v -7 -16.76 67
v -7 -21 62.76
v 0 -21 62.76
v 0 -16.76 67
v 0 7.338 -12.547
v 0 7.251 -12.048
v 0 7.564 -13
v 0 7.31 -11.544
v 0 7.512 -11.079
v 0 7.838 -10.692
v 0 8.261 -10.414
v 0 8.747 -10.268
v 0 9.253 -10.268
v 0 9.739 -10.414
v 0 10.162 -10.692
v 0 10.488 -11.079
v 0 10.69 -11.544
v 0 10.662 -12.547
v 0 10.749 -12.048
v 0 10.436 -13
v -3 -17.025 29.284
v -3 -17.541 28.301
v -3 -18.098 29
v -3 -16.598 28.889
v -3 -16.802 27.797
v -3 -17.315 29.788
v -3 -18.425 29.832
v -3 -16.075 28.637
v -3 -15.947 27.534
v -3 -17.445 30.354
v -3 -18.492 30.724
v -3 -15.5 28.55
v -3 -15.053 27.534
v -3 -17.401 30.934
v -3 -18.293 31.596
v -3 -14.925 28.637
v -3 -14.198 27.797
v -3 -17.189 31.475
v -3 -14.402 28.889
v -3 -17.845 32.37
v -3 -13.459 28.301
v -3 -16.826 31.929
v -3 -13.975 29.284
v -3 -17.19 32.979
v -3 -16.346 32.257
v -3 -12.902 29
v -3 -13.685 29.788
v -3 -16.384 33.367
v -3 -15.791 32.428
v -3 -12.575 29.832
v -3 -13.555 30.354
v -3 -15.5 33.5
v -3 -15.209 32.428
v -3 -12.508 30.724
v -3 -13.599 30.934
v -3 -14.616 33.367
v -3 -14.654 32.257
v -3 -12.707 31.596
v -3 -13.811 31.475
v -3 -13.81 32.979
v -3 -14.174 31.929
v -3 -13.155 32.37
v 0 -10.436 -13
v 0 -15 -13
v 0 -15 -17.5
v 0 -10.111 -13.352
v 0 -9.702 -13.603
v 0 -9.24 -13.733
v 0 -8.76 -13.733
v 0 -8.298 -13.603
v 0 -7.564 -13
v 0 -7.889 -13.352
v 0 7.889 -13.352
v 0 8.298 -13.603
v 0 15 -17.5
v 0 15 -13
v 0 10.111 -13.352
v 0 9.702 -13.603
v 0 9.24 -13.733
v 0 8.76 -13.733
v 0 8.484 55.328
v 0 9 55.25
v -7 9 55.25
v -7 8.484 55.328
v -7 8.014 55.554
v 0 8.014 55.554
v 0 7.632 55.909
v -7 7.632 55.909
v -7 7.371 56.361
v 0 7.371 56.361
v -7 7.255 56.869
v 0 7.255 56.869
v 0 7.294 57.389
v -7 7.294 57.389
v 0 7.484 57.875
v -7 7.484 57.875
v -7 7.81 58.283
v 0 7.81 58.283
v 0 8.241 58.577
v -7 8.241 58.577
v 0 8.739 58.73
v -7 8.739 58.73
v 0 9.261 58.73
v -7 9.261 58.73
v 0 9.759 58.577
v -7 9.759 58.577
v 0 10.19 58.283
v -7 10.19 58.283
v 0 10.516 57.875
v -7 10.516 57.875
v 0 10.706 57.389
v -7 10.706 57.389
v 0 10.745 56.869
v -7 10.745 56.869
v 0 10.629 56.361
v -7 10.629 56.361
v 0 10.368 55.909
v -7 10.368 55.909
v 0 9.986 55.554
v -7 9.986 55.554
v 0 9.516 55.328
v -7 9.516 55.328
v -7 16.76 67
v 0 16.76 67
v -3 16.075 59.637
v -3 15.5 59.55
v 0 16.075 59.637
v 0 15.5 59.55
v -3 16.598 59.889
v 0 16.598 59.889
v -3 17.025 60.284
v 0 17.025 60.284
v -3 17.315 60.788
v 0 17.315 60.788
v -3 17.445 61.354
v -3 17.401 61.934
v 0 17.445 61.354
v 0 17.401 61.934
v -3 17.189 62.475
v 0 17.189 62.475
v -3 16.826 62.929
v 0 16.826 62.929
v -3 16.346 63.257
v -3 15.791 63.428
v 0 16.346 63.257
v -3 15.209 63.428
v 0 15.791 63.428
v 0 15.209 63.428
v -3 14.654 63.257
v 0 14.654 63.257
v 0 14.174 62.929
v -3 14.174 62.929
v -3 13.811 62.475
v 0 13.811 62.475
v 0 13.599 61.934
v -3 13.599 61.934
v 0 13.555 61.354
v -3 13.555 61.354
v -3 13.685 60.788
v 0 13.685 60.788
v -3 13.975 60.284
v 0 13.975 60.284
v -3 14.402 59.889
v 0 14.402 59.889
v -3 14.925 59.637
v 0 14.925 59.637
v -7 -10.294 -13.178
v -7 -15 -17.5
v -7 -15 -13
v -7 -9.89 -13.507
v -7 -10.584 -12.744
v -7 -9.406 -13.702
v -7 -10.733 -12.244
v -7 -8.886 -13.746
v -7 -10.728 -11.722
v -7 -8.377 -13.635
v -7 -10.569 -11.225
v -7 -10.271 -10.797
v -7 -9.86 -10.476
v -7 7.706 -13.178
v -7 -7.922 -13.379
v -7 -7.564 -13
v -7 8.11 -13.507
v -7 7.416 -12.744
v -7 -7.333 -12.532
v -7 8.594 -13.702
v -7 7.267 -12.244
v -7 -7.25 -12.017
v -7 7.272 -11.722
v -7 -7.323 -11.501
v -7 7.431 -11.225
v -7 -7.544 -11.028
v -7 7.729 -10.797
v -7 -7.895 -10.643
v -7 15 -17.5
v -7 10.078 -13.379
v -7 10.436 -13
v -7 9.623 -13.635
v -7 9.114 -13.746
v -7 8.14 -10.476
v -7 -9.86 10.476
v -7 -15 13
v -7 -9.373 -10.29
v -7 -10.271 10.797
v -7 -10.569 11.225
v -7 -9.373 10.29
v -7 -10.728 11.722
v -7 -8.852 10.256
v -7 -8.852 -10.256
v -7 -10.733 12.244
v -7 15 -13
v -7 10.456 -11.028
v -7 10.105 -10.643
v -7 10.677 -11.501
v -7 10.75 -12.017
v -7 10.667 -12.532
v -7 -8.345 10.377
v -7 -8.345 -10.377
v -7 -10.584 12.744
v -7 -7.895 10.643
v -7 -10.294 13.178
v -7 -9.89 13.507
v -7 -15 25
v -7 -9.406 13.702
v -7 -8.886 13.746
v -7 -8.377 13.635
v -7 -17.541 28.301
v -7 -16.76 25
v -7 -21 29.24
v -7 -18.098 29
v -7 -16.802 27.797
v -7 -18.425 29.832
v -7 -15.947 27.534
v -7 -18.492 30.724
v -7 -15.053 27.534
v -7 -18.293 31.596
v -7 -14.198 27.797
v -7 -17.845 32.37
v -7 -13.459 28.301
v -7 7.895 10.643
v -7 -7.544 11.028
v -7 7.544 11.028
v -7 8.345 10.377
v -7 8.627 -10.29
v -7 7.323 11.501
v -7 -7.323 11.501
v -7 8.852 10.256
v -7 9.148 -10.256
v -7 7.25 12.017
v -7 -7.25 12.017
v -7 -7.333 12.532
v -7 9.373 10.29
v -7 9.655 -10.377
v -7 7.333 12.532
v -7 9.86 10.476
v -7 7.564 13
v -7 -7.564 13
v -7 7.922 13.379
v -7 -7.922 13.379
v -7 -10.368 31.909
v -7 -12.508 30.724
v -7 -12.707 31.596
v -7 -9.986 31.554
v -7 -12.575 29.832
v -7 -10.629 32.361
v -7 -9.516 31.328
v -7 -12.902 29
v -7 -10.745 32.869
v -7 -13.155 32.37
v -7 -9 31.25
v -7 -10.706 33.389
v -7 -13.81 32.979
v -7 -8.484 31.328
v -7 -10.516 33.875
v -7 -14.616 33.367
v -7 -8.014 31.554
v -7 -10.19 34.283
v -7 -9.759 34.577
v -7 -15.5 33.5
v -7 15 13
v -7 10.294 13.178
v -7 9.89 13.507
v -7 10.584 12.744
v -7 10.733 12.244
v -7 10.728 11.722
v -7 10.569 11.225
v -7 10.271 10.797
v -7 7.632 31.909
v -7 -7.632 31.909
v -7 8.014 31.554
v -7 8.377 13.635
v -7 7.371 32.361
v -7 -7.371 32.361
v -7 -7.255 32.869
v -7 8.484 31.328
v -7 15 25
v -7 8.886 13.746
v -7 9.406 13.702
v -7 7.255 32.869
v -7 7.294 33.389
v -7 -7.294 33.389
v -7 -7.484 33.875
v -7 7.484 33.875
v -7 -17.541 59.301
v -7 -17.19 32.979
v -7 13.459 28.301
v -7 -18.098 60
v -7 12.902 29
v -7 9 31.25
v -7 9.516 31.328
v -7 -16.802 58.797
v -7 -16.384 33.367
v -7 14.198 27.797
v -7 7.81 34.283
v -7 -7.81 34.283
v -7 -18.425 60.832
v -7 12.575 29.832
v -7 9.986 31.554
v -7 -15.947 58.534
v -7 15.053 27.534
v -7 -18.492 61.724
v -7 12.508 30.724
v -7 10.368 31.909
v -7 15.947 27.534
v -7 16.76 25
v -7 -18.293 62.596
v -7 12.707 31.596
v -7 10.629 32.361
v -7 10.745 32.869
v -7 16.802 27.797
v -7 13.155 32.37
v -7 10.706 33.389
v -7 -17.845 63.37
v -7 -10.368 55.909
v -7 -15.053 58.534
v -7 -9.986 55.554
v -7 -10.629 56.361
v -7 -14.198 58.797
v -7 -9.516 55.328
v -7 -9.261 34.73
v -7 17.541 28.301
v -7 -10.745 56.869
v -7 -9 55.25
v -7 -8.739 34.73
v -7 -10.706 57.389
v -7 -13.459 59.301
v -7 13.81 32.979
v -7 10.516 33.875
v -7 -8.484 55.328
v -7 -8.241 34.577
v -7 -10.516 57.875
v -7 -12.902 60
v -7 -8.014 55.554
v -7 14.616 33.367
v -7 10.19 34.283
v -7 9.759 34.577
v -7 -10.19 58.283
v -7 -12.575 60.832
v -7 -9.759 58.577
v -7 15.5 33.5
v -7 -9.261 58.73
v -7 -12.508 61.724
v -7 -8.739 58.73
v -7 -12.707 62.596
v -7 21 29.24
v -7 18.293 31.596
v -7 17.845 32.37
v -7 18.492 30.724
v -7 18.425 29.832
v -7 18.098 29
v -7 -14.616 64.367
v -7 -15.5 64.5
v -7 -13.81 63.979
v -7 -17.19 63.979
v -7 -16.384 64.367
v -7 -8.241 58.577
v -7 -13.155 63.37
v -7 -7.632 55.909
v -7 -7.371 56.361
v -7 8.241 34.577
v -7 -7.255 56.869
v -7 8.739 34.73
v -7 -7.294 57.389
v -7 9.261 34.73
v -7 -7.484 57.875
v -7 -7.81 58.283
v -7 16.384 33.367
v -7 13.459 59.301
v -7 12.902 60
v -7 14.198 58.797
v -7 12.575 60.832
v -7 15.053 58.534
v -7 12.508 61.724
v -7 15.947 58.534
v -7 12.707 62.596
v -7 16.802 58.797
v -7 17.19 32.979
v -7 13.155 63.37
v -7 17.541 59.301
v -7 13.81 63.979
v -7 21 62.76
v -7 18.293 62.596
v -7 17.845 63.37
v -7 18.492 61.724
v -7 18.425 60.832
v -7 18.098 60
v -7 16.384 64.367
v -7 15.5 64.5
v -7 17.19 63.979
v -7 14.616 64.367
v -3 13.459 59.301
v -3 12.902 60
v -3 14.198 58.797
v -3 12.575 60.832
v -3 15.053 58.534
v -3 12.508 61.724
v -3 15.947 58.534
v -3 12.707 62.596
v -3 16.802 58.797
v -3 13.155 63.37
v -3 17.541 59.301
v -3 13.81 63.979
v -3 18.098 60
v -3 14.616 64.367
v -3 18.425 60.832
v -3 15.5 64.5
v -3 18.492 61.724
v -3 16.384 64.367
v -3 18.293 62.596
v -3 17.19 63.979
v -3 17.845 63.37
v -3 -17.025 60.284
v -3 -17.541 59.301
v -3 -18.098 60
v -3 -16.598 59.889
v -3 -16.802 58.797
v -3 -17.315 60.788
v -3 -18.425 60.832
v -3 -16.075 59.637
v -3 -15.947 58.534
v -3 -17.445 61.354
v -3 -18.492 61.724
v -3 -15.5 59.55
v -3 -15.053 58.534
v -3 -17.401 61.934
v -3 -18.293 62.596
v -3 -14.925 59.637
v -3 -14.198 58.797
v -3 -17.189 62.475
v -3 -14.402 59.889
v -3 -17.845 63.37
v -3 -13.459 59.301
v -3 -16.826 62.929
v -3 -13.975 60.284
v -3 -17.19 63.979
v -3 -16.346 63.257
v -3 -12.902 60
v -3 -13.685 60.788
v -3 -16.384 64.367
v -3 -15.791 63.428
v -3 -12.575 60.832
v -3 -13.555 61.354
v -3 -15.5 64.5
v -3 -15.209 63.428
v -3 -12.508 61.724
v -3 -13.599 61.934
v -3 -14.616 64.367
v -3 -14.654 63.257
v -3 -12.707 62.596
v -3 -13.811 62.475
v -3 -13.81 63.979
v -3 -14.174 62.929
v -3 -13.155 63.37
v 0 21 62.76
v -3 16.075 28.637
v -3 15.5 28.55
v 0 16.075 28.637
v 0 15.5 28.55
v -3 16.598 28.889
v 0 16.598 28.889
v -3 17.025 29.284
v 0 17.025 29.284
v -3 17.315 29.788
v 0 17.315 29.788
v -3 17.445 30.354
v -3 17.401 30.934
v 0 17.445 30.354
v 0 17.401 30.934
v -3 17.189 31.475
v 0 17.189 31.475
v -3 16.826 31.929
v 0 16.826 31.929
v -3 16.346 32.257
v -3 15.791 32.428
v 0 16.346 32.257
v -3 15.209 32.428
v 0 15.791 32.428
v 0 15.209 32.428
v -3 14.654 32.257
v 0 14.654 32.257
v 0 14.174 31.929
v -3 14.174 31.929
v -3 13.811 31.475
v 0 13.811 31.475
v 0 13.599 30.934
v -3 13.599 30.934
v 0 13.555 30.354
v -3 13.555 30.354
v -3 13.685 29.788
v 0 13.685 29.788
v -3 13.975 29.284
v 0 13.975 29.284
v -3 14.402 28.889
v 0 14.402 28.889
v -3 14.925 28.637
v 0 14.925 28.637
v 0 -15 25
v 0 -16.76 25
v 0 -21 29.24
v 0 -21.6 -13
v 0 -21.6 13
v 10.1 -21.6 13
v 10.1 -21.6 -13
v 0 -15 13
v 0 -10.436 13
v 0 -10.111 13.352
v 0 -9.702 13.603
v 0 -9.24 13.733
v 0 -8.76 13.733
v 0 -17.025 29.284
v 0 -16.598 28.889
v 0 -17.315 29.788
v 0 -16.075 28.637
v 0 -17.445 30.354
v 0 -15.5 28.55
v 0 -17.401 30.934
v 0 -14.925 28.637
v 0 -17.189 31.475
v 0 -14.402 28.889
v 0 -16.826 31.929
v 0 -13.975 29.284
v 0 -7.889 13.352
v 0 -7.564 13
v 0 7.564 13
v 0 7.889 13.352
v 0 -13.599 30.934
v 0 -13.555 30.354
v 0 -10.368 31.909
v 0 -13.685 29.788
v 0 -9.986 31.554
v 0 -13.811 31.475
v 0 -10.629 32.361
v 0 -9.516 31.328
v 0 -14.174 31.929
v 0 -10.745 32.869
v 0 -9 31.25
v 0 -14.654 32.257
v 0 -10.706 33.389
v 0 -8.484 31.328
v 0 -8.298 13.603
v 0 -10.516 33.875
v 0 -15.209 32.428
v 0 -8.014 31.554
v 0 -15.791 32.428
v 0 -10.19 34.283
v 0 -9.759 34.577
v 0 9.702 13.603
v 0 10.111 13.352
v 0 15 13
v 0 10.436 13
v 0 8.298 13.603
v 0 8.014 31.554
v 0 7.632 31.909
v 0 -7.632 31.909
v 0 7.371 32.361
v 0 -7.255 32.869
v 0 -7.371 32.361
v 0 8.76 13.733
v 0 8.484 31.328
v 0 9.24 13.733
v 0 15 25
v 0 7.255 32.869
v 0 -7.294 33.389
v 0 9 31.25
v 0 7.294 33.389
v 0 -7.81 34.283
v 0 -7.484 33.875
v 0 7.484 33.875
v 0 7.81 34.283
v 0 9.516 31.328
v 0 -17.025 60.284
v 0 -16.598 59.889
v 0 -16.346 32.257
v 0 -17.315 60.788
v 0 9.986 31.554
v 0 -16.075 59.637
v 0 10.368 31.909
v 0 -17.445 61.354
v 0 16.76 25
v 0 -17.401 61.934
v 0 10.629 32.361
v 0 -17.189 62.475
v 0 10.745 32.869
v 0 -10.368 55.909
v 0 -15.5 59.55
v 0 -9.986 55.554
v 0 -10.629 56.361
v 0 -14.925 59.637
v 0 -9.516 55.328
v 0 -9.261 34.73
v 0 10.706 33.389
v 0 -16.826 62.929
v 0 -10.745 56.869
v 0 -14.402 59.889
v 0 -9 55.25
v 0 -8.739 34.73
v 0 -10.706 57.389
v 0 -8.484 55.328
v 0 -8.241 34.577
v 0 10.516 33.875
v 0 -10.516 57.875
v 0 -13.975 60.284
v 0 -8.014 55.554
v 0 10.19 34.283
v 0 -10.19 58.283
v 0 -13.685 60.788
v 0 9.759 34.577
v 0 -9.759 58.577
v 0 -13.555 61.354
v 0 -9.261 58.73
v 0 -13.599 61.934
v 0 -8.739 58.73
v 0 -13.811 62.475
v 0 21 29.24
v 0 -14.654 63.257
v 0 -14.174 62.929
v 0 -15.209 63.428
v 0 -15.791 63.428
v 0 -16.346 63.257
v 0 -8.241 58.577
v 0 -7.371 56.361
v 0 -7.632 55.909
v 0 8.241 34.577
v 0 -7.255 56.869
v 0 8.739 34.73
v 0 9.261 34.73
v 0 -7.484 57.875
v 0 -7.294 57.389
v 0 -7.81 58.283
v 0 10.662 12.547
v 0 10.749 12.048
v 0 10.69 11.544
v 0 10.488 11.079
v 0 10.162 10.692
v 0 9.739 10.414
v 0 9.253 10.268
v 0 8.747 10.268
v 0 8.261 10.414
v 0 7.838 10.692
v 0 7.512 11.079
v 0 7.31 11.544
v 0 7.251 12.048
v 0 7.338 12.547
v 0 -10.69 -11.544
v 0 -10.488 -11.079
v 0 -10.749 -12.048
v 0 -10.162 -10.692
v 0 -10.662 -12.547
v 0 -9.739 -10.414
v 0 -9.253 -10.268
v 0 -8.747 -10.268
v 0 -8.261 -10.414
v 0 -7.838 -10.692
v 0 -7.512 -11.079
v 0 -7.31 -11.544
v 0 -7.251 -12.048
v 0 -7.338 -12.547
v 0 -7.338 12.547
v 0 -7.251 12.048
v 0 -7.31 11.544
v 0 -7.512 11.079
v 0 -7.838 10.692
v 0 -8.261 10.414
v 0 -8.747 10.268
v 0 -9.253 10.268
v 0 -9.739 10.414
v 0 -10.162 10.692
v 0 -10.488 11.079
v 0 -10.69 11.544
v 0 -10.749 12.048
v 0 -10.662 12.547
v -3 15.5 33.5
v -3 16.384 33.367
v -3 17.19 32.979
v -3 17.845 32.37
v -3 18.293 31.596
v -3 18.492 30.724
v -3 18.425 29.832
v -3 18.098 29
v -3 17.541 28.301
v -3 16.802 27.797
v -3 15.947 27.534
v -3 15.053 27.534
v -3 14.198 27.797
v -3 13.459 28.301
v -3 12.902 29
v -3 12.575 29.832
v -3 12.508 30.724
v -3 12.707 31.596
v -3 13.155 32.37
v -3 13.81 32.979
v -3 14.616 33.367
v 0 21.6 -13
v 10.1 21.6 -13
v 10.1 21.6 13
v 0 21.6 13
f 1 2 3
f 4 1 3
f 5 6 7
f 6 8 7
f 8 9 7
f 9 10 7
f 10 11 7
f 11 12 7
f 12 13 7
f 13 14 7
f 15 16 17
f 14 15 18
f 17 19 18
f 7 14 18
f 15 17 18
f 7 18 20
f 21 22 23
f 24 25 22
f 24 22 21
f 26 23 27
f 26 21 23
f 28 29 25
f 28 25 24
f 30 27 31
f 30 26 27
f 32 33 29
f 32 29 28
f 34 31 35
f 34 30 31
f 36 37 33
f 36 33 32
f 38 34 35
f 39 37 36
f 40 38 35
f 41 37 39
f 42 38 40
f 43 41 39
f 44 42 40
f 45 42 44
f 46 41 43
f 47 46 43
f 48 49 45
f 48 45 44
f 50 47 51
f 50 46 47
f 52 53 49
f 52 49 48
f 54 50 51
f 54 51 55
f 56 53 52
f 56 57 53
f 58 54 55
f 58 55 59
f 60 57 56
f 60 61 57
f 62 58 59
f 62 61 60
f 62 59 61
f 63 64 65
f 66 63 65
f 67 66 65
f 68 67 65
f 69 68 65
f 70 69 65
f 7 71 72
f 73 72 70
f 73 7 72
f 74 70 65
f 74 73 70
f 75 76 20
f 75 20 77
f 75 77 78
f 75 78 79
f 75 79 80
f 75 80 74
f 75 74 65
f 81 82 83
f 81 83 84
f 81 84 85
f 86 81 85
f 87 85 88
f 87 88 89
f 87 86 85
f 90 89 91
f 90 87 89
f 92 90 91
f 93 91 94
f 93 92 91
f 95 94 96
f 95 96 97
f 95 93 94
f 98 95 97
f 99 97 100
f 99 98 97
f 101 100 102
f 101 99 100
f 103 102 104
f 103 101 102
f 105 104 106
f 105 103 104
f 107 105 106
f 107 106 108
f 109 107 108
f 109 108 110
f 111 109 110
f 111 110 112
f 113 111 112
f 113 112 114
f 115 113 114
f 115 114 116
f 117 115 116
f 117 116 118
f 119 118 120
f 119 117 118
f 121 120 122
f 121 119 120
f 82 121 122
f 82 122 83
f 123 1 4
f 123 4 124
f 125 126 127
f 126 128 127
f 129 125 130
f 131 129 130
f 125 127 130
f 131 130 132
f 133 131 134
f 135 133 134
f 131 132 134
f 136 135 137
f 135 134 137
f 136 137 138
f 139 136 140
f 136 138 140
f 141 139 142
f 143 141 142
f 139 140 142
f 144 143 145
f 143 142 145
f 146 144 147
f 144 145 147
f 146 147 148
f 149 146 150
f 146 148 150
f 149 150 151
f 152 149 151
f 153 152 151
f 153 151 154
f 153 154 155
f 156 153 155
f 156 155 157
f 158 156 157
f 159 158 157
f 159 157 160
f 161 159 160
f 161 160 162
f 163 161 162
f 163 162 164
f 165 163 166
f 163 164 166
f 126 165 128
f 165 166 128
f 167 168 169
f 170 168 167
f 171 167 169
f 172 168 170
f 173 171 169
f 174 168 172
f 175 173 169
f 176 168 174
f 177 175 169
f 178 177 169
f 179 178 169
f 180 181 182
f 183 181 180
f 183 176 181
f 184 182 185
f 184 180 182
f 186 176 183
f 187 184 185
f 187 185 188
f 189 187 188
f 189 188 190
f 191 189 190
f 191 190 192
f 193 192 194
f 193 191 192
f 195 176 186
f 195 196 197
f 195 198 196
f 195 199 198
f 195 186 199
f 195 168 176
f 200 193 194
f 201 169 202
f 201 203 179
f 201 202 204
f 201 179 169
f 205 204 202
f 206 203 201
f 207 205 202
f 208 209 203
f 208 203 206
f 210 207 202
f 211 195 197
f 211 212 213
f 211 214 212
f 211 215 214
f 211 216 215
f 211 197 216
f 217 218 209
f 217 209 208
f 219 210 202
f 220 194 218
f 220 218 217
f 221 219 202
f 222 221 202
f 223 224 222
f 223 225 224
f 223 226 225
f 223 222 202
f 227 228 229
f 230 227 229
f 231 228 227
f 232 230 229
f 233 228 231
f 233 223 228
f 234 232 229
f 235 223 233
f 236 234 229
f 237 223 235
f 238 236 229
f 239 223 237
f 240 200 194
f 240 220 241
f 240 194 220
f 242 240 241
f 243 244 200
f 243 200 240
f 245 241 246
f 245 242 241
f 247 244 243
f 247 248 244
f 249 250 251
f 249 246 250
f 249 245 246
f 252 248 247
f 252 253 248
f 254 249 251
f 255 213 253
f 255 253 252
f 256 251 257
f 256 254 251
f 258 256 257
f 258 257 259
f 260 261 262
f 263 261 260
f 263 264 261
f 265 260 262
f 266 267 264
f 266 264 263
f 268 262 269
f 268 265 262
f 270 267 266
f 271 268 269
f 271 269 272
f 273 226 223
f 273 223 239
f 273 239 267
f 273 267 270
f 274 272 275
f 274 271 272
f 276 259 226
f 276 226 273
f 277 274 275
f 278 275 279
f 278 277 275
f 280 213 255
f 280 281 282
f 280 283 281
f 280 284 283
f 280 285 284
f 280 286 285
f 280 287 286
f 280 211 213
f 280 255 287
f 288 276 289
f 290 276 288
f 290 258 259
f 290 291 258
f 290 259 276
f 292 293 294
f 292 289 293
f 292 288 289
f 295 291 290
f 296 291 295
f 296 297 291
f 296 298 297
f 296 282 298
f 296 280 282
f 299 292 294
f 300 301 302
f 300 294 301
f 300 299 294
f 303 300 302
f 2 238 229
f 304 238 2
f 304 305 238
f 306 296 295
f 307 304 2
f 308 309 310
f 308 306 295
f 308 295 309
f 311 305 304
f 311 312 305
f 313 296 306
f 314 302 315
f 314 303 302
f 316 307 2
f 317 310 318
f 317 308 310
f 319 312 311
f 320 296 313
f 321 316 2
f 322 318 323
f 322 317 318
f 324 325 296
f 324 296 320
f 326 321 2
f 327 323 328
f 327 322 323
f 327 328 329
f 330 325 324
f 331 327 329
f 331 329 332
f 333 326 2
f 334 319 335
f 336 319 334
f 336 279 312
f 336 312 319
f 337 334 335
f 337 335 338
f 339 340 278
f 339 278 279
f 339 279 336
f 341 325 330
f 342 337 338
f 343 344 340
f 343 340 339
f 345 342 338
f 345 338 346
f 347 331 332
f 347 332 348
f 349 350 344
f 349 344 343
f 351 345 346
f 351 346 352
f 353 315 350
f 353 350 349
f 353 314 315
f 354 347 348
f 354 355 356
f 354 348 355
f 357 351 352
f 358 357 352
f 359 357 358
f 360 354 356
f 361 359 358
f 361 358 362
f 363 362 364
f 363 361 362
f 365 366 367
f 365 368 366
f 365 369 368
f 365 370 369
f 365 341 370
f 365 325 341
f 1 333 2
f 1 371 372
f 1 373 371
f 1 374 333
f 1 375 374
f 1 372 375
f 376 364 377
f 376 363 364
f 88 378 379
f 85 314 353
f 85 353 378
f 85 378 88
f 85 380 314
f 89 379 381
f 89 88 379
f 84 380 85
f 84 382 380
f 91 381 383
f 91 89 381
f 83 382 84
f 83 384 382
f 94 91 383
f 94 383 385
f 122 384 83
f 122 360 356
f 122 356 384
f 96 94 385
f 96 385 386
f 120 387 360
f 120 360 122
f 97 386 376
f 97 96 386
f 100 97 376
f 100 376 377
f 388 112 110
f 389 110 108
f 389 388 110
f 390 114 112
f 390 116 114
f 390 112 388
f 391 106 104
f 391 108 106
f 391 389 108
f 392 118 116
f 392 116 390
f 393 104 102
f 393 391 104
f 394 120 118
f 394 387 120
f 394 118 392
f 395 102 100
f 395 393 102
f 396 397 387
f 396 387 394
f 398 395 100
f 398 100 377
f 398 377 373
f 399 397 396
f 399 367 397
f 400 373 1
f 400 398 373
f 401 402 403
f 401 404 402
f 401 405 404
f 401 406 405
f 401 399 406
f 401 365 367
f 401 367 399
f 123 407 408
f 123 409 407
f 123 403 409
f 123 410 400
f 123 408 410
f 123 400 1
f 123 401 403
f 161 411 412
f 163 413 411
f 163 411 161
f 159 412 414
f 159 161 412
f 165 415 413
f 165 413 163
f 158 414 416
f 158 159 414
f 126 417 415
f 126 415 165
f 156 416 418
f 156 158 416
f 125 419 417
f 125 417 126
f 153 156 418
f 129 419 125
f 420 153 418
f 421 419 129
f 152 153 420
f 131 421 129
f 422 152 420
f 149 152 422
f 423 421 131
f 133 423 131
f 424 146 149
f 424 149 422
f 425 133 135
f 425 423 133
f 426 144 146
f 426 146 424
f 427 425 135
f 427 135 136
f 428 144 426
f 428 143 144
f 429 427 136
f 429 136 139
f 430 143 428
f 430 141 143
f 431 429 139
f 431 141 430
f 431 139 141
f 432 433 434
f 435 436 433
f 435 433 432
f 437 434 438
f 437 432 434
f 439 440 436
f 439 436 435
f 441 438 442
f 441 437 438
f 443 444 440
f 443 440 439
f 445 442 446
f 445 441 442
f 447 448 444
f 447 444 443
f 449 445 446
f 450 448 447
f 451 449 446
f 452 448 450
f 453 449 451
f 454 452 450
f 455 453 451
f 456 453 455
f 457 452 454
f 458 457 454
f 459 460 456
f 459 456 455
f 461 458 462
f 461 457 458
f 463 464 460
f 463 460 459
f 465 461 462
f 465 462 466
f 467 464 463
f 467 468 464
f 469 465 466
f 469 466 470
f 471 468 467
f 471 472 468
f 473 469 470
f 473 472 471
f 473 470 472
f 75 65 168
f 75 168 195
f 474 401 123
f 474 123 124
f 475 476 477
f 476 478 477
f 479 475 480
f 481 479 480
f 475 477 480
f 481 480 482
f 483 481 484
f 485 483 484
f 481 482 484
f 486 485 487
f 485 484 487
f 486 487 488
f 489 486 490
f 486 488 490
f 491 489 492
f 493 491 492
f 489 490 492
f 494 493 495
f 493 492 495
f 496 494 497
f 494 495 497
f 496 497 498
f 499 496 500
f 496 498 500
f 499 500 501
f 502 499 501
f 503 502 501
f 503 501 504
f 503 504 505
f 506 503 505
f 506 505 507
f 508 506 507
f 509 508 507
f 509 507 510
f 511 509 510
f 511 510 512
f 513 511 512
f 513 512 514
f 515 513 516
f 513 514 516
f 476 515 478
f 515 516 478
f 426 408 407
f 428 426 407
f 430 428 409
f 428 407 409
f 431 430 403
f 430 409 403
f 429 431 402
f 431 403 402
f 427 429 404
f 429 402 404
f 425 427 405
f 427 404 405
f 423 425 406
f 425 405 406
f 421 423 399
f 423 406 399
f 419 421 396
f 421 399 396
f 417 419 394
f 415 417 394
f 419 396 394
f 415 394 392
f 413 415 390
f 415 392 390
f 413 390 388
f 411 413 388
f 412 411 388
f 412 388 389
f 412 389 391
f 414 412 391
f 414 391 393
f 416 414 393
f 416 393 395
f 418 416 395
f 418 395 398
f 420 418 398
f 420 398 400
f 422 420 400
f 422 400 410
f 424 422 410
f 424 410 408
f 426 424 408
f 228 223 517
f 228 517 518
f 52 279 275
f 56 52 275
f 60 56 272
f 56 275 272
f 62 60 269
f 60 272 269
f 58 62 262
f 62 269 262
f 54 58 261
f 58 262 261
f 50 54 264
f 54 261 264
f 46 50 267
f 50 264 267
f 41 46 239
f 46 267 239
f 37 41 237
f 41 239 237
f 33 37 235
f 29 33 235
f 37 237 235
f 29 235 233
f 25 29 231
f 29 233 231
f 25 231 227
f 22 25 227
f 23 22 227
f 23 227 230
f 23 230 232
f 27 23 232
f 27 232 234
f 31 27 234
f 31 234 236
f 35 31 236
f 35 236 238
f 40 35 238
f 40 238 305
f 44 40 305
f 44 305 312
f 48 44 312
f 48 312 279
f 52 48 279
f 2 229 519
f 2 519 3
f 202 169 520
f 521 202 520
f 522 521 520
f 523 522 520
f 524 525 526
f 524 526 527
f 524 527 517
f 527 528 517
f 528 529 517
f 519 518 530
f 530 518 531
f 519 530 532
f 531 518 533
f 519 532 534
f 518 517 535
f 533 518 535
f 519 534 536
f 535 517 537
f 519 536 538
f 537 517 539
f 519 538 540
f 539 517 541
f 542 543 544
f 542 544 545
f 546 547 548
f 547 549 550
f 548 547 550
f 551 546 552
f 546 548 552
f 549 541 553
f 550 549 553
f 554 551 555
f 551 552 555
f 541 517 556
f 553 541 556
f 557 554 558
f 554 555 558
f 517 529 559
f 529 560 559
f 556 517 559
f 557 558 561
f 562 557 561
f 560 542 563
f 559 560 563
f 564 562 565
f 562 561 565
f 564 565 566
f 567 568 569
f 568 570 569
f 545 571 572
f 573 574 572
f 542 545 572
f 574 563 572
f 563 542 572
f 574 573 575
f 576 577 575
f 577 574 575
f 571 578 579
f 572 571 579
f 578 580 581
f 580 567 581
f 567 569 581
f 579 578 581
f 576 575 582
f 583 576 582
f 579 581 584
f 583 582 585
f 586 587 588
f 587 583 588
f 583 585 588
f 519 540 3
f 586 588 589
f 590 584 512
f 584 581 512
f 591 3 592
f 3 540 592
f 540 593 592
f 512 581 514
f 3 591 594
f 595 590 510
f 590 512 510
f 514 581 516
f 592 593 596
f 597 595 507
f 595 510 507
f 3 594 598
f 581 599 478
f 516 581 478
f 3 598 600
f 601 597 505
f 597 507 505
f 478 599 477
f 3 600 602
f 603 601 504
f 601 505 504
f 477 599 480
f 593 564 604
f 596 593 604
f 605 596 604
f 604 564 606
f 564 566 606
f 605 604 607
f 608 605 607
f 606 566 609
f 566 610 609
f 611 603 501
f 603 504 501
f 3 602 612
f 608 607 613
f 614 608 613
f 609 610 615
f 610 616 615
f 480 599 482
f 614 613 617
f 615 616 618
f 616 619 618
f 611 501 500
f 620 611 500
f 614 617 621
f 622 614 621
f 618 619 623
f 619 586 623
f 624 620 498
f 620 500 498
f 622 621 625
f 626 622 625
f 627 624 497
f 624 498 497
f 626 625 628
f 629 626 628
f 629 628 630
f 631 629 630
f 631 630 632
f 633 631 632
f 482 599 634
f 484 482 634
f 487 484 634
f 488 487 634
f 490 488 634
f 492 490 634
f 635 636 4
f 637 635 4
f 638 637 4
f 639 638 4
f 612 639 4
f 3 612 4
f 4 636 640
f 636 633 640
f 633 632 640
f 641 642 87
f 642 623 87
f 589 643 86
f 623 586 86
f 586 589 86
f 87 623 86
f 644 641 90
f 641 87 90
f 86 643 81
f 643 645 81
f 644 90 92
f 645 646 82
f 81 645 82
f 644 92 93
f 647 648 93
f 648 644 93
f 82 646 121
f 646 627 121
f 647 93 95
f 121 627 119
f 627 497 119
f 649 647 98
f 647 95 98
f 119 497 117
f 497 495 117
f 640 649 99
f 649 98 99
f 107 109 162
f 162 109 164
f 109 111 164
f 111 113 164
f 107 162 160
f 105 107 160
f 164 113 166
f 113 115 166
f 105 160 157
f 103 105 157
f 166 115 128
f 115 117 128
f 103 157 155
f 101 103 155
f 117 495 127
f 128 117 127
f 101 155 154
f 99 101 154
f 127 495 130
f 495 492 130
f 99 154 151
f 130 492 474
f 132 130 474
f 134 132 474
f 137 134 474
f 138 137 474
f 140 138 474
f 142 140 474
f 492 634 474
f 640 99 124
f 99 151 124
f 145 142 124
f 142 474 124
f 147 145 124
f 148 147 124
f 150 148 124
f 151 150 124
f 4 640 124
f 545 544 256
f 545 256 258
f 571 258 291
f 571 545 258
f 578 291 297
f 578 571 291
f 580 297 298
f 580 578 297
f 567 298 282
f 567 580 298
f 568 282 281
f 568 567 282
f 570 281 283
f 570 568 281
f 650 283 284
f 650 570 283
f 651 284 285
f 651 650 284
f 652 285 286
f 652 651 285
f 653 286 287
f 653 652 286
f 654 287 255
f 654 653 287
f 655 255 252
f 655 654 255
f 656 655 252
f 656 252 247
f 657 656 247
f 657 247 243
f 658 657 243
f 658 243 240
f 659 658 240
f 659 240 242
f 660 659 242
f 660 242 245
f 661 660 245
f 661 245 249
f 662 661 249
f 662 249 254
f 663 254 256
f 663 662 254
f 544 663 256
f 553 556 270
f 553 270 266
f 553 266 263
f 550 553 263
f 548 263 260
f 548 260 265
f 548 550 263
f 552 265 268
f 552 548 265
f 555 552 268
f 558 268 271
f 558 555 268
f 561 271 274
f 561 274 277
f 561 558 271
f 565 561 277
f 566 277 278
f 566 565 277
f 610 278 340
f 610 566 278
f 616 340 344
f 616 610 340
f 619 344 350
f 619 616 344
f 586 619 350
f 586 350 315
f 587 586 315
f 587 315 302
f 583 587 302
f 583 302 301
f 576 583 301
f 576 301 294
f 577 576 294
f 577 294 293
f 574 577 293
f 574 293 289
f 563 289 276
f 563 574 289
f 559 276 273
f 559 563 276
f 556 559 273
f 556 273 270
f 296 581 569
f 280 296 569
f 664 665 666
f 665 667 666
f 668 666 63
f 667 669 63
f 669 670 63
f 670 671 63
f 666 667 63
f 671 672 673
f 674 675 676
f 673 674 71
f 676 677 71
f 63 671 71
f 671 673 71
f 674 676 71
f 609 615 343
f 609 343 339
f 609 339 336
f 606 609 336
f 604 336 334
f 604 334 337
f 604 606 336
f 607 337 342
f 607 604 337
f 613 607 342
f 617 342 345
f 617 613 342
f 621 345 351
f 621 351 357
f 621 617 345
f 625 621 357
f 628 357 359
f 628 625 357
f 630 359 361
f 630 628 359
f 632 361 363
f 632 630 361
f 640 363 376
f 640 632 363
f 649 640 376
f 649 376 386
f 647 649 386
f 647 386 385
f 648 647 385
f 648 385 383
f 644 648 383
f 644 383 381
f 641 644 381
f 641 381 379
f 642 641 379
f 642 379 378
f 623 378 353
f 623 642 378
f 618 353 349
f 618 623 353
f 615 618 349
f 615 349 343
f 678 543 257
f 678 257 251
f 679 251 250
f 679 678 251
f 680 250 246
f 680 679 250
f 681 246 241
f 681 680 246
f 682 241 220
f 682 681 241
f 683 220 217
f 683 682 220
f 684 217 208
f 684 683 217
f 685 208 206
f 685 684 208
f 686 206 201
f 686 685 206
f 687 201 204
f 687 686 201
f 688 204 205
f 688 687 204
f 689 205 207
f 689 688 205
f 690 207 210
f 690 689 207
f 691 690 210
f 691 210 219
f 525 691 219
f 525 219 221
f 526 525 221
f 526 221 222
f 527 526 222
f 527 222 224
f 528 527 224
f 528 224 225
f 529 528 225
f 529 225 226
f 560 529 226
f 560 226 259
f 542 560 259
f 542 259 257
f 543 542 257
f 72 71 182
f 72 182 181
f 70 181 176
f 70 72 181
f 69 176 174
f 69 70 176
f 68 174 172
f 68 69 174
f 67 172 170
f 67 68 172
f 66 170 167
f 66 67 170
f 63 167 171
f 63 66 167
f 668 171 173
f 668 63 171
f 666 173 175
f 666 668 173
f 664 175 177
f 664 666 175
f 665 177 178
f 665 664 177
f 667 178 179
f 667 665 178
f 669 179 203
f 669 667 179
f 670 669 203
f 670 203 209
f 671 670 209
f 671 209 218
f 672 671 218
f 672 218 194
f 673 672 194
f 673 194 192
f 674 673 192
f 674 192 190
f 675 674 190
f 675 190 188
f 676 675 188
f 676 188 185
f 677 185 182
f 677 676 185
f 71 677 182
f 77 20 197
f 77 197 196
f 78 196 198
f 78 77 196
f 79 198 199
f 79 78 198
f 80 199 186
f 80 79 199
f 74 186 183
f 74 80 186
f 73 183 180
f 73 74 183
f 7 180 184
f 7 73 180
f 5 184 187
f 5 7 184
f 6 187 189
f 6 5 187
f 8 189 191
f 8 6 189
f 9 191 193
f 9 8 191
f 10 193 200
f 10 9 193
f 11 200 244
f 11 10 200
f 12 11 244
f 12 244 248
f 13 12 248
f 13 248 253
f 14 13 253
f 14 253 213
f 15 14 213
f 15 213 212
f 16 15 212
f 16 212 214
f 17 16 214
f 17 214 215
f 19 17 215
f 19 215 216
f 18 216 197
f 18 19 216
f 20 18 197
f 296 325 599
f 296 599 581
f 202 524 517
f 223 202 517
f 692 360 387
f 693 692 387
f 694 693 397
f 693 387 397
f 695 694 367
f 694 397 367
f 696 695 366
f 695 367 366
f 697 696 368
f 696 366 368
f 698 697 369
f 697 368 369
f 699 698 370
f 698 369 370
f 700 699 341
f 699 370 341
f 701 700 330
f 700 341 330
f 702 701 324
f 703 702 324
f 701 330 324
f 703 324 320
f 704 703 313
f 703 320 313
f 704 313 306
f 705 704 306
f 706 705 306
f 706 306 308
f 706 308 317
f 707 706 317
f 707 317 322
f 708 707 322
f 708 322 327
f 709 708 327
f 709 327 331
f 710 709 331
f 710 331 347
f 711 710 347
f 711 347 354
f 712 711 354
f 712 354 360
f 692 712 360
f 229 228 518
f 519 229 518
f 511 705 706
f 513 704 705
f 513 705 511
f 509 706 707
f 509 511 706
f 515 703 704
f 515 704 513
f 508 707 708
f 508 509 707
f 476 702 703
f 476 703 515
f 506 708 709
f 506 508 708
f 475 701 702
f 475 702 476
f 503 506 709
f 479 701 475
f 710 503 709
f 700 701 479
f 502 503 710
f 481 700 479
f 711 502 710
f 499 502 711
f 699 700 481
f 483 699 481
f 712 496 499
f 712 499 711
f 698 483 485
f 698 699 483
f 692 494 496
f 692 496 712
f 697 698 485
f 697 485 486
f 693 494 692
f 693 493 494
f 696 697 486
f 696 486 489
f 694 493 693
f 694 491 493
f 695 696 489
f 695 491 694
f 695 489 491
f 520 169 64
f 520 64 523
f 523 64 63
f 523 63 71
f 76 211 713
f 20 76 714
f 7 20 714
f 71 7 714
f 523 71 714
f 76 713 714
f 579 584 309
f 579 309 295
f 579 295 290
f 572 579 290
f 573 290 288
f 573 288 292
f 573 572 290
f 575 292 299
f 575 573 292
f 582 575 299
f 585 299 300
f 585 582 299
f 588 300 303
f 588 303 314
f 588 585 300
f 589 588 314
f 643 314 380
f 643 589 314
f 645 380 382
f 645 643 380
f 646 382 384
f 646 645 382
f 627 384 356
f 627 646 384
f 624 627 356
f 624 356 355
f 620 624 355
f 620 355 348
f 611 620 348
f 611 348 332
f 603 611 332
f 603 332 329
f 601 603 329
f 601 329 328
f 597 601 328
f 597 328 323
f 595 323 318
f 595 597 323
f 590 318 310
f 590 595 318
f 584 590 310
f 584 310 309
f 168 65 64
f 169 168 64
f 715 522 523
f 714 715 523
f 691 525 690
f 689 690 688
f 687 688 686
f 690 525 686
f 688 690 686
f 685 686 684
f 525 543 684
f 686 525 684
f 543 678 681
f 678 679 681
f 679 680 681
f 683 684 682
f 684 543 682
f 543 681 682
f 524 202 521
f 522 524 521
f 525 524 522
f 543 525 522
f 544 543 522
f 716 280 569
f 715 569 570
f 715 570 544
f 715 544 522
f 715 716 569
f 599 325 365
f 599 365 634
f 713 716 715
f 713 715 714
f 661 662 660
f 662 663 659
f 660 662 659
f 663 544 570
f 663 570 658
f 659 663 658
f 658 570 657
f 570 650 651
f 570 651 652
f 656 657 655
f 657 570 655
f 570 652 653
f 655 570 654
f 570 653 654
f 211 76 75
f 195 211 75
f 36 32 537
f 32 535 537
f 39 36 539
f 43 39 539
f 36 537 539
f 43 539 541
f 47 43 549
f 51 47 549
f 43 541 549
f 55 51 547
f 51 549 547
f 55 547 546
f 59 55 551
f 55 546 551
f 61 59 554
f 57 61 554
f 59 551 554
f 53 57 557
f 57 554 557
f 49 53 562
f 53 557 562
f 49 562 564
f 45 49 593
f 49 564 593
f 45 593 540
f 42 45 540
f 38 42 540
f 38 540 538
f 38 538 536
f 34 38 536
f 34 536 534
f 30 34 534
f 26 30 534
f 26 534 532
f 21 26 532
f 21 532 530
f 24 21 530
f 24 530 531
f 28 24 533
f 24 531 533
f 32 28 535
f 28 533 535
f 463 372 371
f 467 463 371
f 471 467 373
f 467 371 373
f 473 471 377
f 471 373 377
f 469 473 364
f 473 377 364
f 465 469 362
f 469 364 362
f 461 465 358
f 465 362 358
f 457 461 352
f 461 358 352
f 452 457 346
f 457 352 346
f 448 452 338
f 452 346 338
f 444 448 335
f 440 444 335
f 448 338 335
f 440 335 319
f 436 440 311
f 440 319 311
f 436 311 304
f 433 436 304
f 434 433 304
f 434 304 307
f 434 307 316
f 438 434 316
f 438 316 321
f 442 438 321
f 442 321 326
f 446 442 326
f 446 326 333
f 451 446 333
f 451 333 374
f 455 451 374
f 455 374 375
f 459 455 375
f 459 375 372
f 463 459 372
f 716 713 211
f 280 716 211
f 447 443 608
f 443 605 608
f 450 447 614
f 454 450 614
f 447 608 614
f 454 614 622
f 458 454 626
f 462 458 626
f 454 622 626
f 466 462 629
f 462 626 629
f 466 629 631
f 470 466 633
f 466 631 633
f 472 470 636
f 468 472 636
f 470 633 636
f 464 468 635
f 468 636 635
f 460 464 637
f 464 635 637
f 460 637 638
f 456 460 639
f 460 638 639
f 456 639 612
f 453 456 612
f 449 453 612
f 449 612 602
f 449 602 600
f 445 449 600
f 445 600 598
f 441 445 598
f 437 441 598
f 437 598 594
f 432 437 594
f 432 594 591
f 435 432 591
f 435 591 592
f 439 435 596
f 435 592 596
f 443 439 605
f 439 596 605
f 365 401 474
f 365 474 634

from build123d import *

# Parameters (mm, degrees)
SKETCH2_W                                    = 26
SKETCH2_H                                    = 43.2
BOSS_EXTRUDE1_DEPTH                          = 10.1
SKETCH3_R                                    = 1.75
BOSS_EXTRUDE2_DEPTH                          = 7
BOSS_EXTRUDE3_DEPTH                          = 26
BOSS_EXTRUDE4_DEPTH                          = 7
CHAMFER1_SIZE                                = 4.24
CBORE_FOR_M5_HEX_HEAD_CAP_SCREW1_D           = 3.9
CBORE_FOR_M5_HEX_HEAD_CAP_SCREW1_CBORE_D     = 6
CBORE_FOR_M5_HEX_HEAD_CAP_SCREW1_CBORE_DEPTH = 4


with BuildPart() as part:
    # Sketch2 → Boss-Extrude1 (new body)
    with BuildSketch(Plane(origin=(0, 0, 0), x_dir=(0, 0, -1), z_dir=(1, 0, 0))):
        Rectangle(SKETCH2_W, SKETCH2_H)
    extrude(amount=BOSS_EXTRUDE1_DEPTH)

    # Sketch3 → Boss-Extrude2 (add)
    with BuildSketch(Plane.ZY):
        Polygon((-17.5, 15), (17.5, 15), (62.5, 15), (62.5, -15), (17.5, -15), (-17.5, -15), align=None)
        with Locations(Location((12, 9, 0), (0, 0, 304.849904579))):
            Circle(SKETCH3_R, mode=Mode.SUBTRACT)
        with Locations(Location((12, -9, 0), (0, 0, 55.150095421))):
            Circle(SKETCH3_R, mode=Mode.SUBTRACT)
        with Locations(Location((-12, -9, 0), (0, 0, 124.849904579))):
            Circle(SKETCH3_R, mode=Mode.SUBTRACT)
        with Locations(Location((-12, 9, 0), (0, 0, 124.849904579))):
            Circle(SKETCH3_R, mode=Mode.SUBTRACT)
        with Locations(Location((57, -9, 0), (0, 0, 180))):
            Circle(SKETCH3_R, mode=Mode.SUBTRACT)
        with Locations(Location((57, 9, 0), (0, 0, 180))):
            Circle(SKETCH3_R, mode=Mode.SUBTRACT)
        with Locations(Location((33, -9, 0), (0, 0, 180))):
            Circle(SKETCH3_R, mode=Mode.SUBTRACT)
        with Locations(Location((33, 9, 0), (0, 0, 180))):
            Circle(SKETCH3_R, mode=Mode.SUBTRACT)
    extrude(amount=BOSS_EXTRUDE2_DEPTH)

    # Sketch5 → Boss-Extrude3 (add)
    with BuildSketch(Plane(origin=(0, 0, -13), x_dir=(-1, 0, 0), z_dir=(0, 0, -1))):
        Polygon((0, -21.6), (0, -15), (7, -15), align=None)
        Polygon((7, 15), (0, 15), (0, 21.6), align=None)
    extrude(amount=-BOSS_EXTRUDE3_DEPTH)

    # Sketch7 → Boss-Extrude4 (add)
    with BuildSketch(Plane.ZY.offset(7)):
        Polygon((67, -21), (67, 21), (25, 21), (25, 15), (62.5, 15), (62.5, -15), (25, -15), (25, -21), align=None)
    extrude(amount=-BOSS_EXTRUDE4_DEPTH)

    # Chamfer1
    chamfer1_edges = [part.edges().sort_by_distance(p)[0] for p in [
        (-3.5, -21, 25),
        (-3.5, -21, 67),
        (-3.5, 21, 67),
        (-3.5, 21, 25),
    ]]
    chamfer(chamfer1_edges, length=CHAMFER1_SIZE)

    # CBORE for M5 Hex Head Cap Screw1 (through all)
    with Locations(Plane.ZY.offset(7)):
        with Locations((61.5, 15.5), (61.5, -15.5), (30.5, -15.5), (30.5, 15.5)):
            CounterBoreHole(CBORE_FOR_M5_HEX_HEAD_CAP_SCREW1_D / 2, CBORE_FOR_M5_HEX_HEAD_CAP_SCREW1_CBORE_D / 2, CBORE_FOR_M5_HEX_HEAD_CAP_SCREW1_CBORE_DEPTH)


solid = part.part
